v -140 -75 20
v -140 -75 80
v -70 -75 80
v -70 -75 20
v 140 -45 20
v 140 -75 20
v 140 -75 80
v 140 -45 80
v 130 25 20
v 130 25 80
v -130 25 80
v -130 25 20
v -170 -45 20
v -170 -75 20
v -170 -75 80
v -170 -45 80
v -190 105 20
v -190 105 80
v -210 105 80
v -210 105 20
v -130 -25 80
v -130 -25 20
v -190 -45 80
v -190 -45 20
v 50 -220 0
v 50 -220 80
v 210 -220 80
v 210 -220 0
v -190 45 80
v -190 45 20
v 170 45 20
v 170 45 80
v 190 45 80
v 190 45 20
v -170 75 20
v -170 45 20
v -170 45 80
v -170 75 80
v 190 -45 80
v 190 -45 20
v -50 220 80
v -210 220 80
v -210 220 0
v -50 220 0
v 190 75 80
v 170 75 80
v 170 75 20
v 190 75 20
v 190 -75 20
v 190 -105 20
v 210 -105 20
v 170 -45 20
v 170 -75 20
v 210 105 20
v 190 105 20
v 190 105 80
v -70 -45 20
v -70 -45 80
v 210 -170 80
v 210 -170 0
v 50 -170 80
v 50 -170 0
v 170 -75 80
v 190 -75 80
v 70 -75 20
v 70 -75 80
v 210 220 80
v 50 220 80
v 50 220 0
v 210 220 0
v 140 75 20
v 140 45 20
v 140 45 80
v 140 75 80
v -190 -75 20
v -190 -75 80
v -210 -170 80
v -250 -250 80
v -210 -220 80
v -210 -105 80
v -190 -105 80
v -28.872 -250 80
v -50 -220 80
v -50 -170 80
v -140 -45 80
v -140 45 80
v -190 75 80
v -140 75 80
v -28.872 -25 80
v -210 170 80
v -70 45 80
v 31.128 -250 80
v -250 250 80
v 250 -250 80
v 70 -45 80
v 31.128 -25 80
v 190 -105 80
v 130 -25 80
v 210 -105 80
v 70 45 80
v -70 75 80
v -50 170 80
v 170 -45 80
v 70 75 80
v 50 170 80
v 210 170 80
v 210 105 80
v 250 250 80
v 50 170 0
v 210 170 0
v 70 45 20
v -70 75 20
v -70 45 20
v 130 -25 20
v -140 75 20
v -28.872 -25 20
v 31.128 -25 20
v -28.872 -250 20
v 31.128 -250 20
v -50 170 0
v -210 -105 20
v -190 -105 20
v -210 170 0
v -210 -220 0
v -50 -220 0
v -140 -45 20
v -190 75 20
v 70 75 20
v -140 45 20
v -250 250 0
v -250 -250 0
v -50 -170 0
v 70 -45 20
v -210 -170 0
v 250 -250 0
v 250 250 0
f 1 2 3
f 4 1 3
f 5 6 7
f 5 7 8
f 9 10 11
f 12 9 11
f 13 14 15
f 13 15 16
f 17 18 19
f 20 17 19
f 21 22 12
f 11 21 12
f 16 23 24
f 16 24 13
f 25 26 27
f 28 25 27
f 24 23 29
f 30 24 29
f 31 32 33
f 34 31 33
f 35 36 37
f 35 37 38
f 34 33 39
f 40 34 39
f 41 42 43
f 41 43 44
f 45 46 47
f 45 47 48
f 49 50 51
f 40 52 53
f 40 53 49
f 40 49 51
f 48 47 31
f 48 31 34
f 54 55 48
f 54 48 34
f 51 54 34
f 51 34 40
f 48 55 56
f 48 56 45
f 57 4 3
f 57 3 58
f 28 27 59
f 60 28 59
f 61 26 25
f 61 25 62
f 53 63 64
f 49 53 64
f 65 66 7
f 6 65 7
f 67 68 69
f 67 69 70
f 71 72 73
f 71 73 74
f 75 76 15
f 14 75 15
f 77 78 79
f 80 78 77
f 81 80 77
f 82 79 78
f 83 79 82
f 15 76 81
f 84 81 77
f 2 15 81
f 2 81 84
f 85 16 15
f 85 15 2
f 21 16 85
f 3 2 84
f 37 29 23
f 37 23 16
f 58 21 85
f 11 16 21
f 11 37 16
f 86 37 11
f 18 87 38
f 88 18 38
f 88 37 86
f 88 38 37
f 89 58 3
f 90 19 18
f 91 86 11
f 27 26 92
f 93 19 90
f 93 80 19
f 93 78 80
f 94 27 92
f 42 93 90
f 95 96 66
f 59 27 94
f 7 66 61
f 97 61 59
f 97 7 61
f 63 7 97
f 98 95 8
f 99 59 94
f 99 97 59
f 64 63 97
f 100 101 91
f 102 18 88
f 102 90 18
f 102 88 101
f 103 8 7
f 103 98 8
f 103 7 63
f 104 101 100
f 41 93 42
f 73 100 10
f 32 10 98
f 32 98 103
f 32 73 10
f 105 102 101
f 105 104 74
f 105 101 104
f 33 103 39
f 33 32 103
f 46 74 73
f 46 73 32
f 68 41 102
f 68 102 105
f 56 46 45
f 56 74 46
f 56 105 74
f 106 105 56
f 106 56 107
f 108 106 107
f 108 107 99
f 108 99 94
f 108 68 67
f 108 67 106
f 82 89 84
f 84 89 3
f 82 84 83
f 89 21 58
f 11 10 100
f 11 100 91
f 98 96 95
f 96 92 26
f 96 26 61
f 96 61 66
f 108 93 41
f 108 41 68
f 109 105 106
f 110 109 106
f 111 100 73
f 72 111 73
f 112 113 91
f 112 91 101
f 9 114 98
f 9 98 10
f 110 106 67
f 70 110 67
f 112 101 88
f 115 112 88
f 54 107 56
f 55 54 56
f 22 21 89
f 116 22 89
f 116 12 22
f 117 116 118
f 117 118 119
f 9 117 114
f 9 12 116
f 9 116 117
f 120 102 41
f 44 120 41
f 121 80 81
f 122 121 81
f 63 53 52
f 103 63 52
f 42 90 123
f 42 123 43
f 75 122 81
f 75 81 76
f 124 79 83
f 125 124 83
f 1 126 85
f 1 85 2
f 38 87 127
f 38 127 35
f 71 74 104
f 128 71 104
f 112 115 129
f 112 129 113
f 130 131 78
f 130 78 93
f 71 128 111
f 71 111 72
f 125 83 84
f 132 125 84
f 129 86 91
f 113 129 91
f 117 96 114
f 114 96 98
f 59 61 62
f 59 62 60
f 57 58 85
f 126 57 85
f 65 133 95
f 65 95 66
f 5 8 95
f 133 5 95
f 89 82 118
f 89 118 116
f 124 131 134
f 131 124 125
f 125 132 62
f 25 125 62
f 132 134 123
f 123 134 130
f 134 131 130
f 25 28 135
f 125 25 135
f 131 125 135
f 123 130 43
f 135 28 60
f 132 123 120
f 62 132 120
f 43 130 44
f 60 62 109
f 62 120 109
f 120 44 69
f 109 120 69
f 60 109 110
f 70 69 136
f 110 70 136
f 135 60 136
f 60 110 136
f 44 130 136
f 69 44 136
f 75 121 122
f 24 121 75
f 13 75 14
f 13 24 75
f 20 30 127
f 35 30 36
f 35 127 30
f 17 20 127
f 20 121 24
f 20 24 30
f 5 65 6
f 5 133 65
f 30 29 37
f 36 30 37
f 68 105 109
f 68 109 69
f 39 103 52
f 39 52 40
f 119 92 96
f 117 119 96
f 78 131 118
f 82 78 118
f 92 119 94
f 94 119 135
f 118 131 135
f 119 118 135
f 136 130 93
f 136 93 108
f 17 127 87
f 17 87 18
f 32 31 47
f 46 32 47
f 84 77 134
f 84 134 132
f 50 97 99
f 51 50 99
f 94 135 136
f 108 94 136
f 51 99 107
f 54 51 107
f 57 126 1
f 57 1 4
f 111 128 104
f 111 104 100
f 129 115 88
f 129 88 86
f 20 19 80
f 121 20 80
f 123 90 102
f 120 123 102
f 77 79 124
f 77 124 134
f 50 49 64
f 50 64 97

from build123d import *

# Parameters (mm, degrees)
F0_W     = 500
F0_H     = 500
F1_DEPTH = 80
F2_W     = 20
F2_H     = 30
F2_W_2   = 60
F2_H_2   = 50
F2_W_3   = 140
F3_DEPTH = 60
F4_W     = 160
F4_H     = 50
F5_DEPTH = 190
F6_W     = 60
F6_H     = 225
F7_DEPTH = 60


with BuildPart() as f1:
    # F0 (on Top) → F1 (new body)
    with BuildSketch(Plane.XY):
        Rectangle(F0_W, F0_H)
    extrude(amount=F1_DEPTH)

    # F2 (on face) → F3 (cut)
    with BuildSketch(Plane.XY.offset(80)):
        Polygon((-190, 105), (-210, 105), (-210, -105), (-190, -105), (-190, -75), (-190, -45), (-190, 45), (-190, 75), align=None)
        with Locations((-180, 60)):
            Rectangle(F2_W, F2_H)
        with Locations((-180, -60)):
            Rectangle(F2_W, F2_H)
        Polygon((-70, 75), (-140, 75), (-140, 45), (-130, 45), (-70, 45), align=None)
        Polygon((-140, -45), (-140, -75), (-70, -75), (-70, -45), (-130, -45), align=None)
        Polygon((140, 45), (140, 75), (70, 75), (70, 45), (130, 45), align=None)
        Polygon((70, -75), (140, -75), (140, -45), (130, -45), (70, -45), align=None)
        with Locations((180, 60)):
            Rectangle(F2_W, F2_H)
        Polygon((210, 105), (190, 105), (190, 75), (190, 45), (190, -45), (190, -75), (190, -105), (210, -105), align=None)
        with Locations((180, -60)):
            Rectangle(F2_W, F2_H)
        with Locations((-100, 0)):
            Rectangle(F2_W_2, F2_H_2)
        Rectangle(F2_W_3, F2_H_2)
        with Locations((100, 0)):
            Rectangle(F2_W_2, F2_H_2)
    extrude(amount=-F3_DEPTH, mode=Mode.SUBTRACT)

    # F4 (on face) → F5 (cut)
    with BuildSketch(Plane.XY.offset(80)):
        with Locations((-130, 195)):
            Rectangle(F4_W, F4_H)
        with Locations((130, 195)):
            Rectangle(F4_W, F4_H)
        with Locations((130, -195)):
            Rectangle(F4_W, F4_H)
        with Locations((-130, -195)):
            Rectangle(F4_W, F4_H)
    extrude(amount=-F5_DEPTH, mode=Mode.SUBTRACT)

    # F6 (on face) → F7 (cut)
    with BuildSketch(Plane.XY.offset(80)):
        with Locations((1.1277186871, -137.5)):
            Rectangle(F6_W, F6_H)
    extrude(amount=-F7_DEPTH, mode=Mode.SUBTRACT)


solid = f1.part
